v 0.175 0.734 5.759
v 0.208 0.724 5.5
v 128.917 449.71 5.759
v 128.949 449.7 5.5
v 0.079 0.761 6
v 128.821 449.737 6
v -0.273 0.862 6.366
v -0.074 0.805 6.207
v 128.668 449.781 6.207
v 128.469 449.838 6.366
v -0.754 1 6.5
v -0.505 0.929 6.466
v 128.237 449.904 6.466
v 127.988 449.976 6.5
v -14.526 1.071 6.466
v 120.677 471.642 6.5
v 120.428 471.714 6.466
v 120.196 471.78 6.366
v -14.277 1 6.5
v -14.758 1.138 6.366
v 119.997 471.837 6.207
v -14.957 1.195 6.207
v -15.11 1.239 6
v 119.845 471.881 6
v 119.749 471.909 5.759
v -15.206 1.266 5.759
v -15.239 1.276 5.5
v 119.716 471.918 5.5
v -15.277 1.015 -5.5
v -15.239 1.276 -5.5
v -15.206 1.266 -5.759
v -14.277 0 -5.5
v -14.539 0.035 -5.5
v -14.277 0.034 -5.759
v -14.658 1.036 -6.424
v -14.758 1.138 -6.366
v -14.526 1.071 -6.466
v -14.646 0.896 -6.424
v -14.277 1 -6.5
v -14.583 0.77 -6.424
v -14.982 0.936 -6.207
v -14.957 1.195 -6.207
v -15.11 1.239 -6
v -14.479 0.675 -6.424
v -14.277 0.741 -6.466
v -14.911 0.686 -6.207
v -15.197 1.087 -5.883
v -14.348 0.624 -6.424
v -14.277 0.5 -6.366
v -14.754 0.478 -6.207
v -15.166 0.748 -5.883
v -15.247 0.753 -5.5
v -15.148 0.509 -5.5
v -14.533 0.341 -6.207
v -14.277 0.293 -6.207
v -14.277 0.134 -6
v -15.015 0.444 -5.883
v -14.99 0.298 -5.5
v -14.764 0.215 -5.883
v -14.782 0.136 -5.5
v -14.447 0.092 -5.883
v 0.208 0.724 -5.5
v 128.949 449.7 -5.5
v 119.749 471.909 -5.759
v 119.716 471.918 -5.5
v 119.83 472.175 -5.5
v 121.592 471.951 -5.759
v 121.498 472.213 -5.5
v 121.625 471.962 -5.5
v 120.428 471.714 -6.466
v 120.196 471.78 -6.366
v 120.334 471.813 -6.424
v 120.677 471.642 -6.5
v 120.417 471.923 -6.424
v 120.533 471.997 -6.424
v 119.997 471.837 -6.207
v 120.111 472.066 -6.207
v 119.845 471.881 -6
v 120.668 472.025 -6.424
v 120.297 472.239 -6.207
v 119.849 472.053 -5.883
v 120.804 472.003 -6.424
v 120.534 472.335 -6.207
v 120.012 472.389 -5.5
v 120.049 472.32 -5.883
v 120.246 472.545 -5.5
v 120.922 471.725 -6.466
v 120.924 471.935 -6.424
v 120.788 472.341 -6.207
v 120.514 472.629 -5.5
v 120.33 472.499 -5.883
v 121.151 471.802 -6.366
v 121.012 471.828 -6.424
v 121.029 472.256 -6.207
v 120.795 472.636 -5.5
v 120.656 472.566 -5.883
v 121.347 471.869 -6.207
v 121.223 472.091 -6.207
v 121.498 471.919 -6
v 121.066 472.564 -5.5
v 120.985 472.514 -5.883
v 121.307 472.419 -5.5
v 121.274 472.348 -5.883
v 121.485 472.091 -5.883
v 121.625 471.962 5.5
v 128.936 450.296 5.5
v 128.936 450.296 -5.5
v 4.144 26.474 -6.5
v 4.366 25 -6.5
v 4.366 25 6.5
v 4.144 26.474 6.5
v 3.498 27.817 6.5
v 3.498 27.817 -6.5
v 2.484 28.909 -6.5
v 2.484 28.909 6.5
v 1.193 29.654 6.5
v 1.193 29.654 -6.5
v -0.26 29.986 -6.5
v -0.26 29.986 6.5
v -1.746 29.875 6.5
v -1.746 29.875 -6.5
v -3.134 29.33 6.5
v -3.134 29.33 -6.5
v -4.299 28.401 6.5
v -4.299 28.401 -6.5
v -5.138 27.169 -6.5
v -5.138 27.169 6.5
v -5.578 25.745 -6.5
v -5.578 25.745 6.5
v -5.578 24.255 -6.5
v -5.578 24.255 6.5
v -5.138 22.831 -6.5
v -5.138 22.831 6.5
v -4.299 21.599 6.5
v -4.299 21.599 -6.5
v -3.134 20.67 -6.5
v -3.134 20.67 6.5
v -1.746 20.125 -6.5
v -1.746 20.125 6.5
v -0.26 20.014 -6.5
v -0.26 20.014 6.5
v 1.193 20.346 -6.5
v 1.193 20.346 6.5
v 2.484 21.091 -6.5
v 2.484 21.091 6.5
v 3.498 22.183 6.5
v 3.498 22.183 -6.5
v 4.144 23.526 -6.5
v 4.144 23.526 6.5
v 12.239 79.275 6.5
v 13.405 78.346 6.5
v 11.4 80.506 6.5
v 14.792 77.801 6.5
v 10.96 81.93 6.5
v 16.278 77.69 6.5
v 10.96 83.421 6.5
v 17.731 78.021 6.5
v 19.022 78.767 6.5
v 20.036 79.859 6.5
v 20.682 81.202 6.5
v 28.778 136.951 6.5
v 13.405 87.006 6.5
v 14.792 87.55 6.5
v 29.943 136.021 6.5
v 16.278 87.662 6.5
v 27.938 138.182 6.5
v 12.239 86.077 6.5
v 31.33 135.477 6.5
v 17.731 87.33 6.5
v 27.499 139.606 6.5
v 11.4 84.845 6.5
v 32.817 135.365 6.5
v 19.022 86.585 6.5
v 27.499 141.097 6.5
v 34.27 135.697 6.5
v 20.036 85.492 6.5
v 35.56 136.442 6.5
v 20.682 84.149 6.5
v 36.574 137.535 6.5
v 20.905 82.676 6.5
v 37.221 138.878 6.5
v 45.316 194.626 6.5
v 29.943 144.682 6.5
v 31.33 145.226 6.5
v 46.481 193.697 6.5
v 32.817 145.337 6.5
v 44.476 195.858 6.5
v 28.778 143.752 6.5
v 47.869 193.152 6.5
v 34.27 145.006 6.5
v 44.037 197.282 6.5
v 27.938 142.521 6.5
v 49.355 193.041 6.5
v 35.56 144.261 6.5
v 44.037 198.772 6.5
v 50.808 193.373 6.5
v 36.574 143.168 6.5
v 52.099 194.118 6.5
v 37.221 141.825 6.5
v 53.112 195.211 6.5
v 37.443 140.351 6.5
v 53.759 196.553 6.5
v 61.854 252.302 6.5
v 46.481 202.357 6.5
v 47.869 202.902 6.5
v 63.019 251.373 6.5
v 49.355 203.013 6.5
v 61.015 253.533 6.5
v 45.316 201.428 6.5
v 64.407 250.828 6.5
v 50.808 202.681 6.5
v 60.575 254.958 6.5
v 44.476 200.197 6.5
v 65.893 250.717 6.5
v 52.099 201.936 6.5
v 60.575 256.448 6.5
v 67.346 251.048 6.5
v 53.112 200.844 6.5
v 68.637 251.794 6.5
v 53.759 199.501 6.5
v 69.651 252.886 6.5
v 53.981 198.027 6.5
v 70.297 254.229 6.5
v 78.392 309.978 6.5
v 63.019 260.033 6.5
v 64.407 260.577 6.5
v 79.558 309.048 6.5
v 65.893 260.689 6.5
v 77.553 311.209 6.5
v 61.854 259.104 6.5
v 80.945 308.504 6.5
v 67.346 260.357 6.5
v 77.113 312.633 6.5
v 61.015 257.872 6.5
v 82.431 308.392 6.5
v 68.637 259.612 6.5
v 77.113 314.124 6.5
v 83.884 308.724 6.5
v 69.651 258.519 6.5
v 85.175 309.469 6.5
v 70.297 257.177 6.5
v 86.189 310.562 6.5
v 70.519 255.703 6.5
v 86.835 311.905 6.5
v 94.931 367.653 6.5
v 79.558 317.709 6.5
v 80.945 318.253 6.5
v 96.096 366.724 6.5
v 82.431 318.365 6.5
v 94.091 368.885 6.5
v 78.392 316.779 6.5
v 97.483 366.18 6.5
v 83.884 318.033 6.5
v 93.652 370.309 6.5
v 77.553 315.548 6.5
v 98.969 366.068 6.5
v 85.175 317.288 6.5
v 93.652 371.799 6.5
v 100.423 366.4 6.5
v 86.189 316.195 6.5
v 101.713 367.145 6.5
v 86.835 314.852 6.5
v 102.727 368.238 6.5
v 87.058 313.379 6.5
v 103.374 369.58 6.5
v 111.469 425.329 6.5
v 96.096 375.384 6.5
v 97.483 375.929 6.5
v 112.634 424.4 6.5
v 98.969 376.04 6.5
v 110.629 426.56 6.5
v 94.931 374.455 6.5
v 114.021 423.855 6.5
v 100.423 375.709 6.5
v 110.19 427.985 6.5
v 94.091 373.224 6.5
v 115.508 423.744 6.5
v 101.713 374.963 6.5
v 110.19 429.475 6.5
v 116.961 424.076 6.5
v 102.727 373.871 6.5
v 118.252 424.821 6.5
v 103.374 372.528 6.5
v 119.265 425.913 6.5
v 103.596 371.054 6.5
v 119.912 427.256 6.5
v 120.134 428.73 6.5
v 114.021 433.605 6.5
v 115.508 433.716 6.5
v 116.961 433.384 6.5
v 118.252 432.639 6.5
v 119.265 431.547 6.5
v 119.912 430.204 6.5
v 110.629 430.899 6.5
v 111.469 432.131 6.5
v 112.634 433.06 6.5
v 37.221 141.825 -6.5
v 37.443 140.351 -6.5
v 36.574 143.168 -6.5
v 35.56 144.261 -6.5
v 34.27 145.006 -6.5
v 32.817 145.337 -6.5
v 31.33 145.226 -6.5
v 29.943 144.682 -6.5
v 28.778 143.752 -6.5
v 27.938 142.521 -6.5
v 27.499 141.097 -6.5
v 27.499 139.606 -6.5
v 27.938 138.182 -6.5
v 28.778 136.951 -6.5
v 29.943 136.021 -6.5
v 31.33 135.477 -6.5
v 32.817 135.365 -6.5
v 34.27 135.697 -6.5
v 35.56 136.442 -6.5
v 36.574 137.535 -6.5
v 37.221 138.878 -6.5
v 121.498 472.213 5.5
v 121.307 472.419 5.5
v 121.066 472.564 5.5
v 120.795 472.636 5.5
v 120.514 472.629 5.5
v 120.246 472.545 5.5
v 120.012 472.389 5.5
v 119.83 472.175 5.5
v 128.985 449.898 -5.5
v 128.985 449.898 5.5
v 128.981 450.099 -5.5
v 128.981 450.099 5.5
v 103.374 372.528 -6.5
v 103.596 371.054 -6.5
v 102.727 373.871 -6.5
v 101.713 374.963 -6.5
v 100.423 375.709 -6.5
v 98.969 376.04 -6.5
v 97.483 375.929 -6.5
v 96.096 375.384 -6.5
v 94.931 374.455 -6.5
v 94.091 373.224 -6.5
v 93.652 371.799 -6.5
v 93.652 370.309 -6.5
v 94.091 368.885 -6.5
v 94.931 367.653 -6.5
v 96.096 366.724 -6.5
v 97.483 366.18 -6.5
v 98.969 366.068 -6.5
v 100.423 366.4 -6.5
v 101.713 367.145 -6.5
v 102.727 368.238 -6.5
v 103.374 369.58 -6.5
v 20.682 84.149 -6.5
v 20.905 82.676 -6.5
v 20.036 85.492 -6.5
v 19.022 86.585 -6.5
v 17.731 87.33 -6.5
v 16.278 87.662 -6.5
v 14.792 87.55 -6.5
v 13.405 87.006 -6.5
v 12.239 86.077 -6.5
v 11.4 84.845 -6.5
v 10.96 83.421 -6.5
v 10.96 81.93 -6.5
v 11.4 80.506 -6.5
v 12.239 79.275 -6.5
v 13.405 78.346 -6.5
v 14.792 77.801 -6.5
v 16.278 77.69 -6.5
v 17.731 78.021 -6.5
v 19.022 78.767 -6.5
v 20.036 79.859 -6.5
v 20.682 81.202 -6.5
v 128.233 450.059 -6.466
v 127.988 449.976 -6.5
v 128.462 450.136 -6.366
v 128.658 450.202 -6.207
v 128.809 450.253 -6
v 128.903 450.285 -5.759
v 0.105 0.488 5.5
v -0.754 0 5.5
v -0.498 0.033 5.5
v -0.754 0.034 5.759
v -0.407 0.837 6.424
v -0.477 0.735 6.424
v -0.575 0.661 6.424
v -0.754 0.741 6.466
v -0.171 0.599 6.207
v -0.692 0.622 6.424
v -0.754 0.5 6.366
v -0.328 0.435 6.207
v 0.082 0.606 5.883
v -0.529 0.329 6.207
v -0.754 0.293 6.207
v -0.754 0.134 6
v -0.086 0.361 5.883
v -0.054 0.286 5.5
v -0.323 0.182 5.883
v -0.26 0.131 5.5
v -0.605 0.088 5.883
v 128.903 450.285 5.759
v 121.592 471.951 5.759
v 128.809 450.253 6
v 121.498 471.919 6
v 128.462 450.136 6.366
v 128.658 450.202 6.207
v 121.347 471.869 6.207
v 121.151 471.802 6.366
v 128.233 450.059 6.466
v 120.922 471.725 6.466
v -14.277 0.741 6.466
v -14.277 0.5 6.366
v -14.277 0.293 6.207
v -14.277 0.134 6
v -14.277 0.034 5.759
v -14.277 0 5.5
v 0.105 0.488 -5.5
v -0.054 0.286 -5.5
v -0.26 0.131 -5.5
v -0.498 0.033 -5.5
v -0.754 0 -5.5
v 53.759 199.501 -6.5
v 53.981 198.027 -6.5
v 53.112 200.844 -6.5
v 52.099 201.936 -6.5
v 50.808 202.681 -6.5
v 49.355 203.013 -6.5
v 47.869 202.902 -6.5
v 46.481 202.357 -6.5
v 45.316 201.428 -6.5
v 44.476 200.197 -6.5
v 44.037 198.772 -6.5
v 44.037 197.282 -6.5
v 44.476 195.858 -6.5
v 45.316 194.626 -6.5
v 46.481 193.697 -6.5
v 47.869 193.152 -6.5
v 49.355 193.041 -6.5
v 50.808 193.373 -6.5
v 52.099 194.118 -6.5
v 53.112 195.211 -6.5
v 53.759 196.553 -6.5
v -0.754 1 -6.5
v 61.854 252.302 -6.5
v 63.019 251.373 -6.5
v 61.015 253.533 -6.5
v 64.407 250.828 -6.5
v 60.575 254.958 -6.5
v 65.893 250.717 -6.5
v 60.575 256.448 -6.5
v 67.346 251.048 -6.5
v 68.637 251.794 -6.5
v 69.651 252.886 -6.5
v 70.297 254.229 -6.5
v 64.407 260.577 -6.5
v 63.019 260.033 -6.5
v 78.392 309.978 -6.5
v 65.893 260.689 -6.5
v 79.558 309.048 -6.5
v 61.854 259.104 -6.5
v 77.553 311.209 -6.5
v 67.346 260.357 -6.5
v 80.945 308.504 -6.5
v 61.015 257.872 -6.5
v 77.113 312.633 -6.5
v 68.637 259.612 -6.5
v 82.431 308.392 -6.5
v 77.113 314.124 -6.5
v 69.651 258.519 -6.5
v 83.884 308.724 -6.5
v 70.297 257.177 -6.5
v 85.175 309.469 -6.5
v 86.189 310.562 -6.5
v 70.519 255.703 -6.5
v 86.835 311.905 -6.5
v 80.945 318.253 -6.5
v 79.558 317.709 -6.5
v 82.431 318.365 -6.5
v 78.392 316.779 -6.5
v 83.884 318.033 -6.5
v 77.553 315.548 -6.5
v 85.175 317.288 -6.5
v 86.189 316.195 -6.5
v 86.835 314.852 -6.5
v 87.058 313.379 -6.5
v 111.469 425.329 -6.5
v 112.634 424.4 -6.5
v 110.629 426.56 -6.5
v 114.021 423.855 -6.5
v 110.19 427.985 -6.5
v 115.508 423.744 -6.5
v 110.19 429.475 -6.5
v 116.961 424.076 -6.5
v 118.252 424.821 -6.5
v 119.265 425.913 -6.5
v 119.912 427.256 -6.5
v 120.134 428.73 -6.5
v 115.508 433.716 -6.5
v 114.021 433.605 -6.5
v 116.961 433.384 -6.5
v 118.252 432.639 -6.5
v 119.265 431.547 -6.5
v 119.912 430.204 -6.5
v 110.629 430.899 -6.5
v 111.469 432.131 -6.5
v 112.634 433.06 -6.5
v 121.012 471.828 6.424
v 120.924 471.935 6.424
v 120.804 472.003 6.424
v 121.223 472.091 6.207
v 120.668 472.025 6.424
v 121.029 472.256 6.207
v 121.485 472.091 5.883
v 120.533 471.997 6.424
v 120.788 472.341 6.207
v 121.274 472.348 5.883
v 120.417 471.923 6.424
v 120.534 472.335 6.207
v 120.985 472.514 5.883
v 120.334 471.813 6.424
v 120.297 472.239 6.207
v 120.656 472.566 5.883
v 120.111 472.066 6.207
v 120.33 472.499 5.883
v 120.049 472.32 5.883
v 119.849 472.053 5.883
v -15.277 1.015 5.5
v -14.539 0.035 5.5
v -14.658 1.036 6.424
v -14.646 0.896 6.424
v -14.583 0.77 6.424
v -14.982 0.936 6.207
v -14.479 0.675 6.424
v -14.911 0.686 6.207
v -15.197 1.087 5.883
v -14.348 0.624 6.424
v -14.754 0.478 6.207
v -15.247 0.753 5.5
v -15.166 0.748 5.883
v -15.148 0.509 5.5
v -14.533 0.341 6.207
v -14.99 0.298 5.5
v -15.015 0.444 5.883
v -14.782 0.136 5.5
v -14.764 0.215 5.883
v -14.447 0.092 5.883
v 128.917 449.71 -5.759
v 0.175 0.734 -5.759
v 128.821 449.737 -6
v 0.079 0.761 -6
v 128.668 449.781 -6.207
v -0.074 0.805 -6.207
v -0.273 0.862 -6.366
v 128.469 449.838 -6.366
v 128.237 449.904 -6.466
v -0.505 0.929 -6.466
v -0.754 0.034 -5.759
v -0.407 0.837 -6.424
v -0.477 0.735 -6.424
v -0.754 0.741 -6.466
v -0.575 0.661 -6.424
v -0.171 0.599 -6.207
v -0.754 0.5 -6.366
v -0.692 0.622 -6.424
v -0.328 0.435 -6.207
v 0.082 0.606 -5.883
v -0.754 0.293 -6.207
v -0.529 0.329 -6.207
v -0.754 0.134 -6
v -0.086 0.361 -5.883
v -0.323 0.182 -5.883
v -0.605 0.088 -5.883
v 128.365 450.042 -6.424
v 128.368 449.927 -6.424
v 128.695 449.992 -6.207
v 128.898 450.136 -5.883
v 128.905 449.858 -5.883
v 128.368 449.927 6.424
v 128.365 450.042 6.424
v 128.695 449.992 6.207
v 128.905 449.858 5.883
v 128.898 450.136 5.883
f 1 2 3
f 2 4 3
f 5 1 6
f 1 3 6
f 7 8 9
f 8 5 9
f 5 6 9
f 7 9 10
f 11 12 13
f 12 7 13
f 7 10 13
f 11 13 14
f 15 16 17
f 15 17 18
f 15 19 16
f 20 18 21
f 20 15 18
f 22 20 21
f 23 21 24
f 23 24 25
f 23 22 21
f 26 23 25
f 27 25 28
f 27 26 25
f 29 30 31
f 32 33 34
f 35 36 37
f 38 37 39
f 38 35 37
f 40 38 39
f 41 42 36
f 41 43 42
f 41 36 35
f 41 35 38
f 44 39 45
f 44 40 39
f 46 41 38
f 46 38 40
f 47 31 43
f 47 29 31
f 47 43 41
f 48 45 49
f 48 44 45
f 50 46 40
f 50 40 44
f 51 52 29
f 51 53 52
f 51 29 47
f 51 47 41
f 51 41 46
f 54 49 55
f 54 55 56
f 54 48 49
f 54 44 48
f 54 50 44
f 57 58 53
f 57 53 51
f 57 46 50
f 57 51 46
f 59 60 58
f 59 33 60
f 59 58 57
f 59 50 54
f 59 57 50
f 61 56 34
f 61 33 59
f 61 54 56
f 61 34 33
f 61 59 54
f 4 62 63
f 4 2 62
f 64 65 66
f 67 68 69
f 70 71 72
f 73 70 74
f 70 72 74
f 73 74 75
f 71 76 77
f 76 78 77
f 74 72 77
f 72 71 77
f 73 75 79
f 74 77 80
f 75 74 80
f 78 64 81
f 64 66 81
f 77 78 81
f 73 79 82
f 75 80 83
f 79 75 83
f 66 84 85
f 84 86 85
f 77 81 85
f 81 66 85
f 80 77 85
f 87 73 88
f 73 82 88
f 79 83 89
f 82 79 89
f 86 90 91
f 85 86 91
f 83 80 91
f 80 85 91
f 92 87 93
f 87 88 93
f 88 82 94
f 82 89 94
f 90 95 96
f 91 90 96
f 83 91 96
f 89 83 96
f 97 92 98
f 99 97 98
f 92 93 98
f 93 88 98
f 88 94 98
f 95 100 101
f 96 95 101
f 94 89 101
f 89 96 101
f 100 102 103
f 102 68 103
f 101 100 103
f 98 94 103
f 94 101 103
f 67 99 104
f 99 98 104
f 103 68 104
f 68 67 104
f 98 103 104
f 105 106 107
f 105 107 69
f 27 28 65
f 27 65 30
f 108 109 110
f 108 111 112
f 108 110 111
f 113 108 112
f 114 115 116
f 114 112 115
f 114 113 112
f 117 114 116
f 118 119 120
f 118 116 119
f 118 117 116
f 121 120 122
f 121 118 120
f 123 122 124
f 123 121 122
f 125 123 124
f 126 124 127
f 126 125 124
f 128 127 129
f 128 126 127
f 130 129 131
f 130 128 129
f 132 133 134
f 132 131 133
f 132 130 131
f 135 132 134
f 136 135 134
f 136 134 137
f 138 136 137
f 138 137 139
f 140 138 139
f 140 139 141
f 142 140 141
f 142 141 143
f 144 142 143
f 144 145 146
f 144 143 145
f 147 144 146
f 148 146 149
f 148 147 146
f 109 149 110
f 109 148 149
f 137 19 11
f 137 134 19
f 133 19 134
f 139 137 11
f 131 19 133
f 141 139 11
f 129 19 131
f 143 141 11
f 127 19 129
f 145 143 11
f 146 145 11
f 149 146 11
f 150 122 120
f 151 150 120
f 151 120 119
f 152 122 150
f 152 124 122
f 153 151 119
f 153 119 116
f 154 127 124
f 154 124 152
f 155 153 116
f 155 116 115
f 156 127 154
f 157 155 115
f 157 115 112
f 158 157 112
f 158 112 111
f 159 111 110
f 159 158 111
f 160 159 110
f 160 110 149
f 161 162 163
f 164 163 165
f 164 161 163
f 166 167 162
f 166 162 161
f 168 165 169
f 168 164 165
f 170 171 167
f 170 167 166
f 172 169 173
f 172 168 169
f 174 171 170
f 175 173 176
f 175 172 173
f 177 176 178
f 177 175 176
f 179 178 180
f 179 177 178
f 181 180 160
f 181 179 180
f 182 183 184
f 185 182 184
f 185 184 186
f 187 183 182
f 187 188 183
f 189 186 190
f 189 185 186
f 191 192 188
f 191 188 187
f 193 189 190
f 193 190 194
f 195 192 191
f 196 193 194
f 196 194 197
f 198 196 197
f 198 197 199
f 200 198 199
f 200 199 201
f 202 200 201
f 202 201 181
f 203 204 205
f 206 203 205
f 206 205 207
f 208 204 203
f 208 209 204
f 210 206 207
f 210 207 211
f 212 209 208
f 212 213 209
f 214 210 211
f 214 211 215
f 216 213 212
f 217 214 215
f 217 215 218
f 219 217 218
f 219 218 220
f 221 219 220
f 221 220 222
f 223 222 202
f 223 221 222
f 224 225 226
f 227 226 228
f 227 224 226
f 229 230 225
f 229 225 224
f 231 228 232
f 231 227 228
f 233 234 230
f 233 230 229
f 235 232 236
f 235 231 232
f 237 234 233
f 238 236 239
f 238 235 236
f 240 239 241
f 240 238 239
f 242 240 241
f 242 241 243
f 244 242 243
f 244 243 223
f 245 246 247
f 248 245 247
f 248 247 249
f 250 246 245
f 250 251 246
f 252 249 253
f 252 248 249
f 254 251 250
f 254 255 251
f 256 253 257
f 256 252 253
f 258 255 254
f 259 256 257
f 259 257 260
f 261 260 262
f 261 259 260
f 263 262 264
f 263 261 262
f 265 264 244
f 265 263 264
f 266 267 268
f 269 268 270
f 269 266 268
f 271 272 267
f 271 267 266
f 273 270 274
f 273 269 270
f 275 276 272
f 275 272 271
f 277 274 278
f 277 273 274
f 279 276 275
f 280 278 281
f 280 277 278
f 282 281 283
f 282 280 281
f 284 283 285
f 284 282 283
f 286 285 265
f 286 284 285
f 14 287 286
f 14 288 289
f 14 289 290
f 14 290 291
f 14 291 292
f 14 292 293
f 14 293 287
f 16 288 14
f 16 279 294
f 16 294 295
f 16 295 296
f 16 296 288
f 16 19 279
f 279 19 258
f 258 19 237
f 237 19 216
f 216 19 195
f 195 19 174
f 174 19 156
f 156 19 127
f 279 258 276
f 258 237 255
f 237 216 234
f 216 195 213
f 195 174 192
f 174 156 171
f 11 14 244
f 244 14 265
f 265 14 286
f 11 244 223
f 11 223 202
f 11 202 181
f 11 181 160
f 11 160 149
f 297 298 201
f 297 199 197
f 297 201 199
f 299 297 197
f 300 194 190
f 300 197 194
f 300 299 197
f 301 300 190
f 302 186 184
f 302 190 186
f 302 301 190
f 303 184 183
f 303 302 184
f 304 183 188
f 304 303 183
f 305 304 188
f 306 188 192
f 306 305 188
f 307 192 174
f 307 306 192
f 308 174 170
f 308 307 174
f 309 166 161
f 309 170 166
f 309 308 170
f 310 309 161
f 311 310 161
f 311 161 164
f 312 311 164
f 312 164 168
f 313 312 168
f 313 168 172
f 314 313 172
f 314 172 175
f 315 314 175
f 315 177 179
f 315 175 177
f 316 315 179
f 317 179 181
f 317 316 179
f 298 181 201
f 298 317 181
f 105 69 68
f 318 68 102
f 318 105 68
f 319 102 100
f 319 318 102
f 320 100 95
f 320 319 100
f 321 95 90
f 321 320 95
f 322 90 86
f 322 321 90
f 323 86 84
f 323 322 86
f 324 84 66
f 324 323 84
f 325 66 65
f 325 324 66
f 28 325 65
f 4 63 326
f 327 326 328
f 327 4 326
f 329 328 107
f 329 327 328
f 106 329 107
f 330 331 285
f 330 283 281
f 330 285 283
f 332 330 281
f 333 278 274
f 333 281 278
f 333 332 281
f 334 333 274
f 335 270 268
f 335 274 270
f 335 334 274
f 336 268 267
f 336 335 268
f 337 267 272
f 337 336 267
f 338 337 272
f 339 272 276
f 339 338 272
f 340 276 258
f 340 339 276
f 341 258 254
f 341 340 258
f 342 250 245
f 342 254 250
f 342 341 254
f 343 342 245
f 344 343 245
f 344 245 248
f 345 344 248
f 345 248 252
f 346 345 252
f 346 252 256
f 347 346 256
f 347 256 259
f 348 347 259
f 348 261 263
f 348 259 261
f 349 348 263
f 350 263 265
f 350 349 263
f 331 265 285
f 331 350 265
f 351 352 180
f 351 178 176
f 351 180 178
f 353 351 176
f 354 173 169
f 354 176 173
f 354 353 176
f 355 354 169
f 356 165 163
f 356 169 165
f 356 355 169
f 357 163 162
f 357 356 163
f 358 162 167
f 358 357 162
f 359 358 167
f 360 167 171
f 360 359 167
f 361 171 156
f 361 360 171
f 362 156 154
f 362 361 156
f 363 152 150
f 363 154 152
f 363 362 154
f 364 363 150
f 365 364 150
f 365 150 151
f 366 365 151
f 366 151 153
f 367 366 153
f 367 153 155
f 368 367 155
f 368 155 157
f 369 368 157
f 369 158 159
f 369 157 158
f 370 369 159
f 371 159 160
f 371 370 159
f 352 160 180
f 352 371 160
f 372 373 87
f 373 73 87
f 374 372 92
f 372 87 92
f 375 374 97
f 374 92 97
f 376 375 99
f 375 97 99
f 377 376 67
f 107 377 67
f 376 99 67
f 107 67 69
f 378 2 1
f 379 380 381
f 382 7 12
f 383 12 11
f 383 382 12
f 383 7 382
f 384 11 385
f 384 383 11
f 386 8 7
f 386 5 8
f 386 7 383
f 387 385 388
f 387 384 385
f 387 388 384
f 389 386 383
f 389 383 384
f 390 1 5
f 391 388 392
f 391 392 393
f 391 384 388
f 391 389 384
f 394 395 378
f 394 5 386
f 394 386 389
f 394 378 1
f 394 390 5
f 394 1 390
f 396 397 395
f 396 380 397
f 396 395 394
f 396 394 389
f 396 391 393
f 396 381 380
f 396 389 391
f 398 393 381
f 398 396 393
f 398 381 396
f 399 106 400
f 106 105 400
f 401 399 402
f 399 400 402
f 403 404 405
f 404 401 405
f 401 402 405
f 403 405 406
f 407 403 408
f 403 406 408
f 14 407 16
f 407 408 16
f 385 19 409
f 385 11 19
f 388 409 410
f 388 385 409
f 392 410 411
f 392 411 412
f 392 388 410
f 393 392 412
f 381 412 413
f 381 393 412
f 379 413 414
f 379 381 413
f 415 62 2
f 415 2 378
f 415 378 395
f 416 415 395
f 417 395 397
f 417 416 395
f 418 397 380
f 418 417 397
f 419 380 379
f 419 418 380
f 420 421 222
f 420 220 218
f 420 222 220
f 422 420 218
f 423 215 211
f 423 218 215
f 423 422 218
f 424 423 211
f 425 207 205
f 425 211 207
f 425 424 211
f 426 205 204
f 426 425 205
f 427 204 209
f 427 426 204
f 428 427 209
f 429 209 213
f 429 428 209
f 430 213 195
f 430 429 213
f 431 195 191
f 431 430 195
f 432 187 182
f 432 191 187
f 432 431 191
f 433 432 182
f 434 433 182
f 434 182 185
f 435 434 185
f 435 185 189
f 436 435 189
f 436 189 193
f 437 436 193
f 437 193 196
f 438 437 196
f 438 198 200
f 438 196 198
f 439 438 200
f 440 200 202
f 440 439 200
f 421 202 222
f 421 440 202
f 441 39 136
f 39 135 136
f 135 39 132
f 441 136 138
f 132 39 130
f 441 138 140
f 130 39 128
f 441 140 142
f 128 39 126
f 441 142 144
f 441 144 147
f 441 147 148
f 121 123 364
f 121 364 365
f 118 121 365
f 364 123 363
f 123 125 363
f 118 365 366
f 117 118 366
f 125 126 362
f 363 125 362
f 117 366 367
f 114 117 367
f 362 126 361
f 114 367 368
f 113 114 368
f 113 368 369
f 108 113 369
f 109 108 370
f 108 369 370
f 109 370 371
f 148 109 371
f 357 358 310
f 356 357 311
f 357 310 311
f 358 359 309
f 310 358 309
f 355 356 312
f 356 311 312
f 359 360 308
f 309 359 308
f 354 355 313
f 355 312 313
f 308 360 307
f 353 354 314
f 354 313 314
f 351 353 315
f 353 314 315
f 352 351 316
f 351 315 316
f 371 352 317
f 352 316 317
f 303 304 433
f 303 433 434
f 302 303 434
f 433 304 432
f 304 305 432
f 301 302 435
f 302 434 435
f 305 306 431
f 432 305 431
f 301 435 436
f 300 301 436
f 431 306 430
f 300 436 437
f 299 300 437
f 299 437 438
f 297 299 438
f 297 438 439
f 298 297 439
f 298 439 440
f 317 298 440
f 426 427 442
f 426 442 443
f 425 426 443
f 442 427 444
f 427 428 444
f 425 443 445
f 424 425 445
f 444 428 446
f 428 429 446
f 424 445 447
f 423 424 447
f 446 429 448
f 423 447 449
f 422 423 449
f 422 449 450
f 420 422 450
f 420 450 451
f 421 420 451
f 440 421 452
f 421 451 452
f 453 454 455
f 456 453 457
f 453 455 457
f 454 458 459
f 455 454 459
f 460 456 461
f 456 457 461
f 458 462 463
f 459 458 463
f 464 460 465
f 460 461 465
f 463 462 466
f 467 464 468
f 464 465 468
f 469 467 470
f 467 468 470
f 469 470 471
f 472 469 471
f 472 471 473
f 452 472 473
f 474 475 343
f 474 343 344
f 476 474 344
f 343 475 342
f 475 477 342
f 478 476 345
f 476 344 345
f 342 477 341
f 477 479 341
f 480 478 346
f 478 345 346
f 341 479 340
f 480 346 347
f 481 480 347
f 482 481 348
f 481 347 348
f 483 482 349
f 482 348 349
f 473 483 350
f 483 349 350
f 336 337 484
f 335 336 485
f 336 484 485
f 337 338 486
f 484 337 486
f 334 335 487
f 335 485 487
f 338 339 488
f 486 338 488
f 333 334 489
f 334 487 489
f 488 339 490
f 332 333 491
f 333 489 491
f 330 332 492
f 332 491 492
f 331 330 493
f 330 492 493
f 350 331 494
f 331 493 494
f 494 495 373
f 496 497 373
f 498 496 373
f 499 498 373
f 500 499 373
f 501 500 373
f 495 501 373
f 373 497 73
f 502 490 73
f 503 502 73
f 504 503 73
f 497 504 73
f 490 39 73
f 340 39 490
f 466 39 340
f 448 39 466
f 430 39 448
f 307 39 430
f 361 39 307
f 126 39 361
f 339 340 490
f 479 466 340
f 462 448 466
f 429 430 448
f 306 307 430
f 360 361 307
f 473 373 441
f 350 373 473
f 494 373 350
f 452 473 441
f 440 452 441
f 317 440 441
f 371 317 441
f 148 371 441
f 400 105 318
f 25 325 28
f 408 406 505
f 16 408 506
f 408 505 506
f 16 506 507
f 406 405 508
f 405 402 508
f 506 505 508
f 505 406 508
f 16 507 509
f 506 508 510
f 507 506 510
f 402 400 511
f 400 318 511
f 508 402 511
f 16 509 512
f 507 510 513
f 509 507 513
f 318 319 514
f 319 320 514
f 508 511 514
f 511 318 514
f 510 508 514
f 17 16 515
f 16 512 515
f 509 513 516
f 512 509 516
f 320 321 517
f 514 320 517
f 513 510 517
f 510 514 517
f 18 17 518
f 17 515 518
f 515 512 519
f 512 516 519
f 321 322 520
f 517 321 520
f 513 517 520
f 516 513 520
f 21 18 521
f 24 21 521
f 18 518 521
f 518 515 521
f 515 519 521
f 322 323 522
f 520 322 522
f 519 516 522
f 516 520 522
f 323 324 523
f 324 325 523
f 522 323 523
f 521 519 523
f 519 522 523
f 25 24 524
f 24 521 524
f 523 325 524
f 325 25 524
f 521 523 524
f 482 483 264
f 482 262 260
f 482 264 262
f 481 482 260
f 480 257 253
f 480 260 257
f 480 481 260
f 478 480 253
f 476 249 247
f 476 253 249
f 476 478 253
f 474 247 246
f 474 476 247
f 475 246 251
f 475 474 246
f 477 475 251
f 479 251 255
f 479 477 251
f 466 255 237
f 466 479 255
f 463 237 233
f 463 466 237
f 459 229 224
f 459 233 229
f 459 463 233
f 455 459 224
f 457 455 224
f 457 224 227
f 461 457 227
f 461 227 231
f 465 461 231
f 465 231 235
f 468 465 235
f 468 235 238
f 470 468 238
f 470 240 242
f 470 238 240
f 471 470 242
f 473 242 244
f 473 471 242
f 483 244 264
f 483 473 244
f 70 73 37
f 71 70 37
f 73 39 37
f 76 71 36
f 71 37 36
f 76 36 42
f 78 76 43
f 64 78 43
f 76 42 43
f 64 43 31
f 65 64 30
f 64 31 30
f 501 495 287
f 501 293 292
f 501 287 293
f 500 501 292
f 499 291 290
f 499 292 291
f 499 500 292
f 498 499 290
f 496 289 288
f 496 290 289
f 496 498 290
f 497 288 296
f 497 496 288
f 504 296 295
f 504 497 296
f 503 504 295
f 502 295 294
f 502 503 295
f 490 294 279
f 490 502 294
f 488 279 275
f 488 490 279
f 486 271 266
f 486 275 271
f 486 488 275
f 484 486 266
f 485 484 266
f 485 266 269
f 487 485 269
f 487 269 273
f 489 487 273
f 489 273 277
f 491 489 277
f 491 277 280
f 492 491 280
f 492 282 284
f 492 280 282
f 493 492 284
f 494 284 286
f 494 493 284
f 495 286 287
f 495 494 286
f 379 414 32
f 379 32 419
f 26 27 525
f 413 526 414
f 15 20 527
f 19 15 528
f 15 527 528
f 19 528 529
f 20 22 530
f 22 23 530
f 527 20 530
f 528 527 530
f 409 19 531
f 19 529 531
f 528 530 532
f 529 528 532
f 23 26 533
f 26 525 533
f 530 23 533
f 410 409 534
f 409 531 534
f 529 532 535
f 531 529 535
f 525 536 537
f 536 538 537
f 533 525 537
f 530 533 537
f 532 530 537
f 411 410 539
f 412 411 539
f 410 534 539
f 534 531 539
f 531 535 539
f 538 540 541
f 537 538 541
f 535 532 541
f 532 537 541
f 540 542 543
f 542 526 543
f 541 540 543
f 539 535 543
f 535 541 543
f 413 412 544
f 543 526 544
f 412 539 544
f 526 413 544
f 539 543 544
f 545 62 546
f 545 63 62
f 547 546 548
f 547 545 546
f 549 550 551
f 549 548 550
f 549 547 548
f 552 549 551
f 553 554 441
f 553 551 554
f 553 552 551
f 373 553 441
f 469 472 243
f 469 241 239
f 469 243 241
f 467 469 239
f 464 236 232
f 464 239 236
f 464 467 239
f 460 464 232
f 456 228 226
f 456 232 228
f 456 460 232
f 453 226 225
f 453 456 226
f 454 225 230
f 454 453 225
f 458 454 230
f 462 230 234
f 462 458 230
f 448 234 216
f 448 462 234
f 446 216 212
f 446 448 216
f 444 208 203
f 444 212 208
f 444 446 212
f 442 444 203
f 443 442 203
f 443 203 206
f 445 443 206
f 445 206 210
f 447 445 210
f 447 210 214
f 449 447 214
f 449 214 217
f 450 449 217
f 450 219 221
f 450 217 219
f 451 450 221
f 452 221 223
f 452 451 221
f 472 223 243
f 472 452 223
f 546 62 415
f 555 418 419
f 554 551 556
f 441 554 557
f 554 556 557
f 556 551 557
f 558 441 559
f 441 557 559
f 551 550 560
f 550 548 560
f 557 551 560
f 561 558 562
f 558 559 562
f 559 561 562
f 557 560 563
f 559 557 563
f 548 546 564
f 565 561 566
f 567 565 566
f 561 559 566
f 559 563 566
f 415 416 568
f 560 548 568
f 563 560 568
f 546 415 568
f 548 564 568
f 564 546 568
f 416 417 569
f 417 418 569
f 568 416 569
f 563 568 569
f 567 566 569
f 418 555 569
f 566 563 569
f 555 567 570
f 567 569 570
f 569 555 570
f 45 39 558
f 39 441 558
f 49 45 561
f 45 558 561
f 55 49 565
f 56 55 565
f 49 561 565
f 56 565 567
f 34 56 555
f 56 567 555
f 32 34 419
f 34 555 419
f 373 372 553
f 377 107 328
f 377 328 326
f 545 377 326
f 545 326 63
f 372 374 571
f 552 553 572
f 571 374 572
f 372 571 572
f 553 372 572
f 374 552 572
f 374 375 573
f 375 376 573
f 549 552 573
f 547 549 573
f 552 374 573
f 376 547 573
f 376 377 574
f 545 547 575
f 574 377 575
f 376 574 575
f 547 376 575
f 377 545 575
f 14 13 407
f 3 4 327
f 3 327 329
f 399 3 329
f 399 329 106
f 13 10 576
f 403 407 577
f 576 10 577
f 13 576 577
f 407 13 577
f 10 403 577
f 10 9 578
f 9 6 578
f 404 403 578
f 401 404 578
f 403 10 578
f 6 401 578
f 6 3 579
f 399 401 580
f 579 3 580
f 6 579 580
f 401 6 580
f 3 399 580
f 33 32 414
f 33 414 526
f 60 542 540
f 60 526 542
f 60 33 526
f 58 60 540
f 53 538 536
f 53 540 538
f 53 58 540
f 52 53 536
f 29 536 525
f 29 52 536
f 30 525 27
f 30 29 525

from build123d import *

# Parameters (mm, degrees)
BOSS_EXTRUDE1_DEPTH     = 6.5
CUT_EXTRUDE1_DEPTH      = 493.386170136
CUT_EXTRUDE1_DEPTH_BACK = 493.386170136
SKETCH2_R               = 5
FILLET1_R               = 1


with BuildPart() as part:
    # Sketch1 → Boss-Extrude1 (new, symmetric)
    with BuildSketch(Plane.XY):
        Polygon((0, 0), (129.035423591, 450), (120.599566698, 475), (-15.604491538, 0), align=None)
    extrude(amount=BOSS_EXTRUDE1_DEPTH, both=True)

    # Sketch2 → Cut-Extrude1 (cut, two sides: drawn at the far end of the back side and taken through both)
    with BuildSketch(Plane.XY.offset(6.5).offset(-CUT_EXTRUDE1_DEPTH_BACK)):
        with Locations((-0.633611125, 25)):
            Circle(SKETCH2_R)
        with Locations((15.904630224, 82.675701756)):
            Circle(SKETCH2_R)
        with Locations((32.442871573, 140.351403513)):
            Circle(SKETCH2_R)
        with Locations((48.981112922, 198.027105269)):
            Circle(SKETCH2_R)
        with Locations((65.519354271, 255.702807025)):
            Circle(SKETCH2_R)
        with Locations((82.05759562, 313.378508781)):
            Circle(SKETCH2_R)
        with Locations((98.595836969, 371.054210538)):
            Circle(SKETCH2_R)
        with Locations((115.134078318, 428.729912294)):
            Circle(SKETCH2_R)
    extrude(amount=CUT_EXTRUDE1_DEPTH + CUT_EXTRUDE1_DEPTH_BACK, mode=Mode.SUBTRACT)

    # Fillet1
    fillet1_edges = [part.edges().sort_by_distance(p)[0] for p in [
        (124.817495144, 462.5, 6.5),
        (52.49753758, 237.5, 6.5),
        (-7.802245769, 0, 6.5),
        (52.49753758, 237.5, -6.5),
        (124.817495144, 462.5, -6.5),
        (64.517711796, 225, -6.5),
        (-7.802245769, 0, -6.5),
        (-15.604491538, 0, 0),
        (120.599566698, 475, 0),
        (129.035423591, 450, 0),
        (0, 0, 0),
        (64.517711796, 225, 6.5),
    ]]
    fillet(fillet1_edges, radius=FILLET1_R)


solid = part.part
